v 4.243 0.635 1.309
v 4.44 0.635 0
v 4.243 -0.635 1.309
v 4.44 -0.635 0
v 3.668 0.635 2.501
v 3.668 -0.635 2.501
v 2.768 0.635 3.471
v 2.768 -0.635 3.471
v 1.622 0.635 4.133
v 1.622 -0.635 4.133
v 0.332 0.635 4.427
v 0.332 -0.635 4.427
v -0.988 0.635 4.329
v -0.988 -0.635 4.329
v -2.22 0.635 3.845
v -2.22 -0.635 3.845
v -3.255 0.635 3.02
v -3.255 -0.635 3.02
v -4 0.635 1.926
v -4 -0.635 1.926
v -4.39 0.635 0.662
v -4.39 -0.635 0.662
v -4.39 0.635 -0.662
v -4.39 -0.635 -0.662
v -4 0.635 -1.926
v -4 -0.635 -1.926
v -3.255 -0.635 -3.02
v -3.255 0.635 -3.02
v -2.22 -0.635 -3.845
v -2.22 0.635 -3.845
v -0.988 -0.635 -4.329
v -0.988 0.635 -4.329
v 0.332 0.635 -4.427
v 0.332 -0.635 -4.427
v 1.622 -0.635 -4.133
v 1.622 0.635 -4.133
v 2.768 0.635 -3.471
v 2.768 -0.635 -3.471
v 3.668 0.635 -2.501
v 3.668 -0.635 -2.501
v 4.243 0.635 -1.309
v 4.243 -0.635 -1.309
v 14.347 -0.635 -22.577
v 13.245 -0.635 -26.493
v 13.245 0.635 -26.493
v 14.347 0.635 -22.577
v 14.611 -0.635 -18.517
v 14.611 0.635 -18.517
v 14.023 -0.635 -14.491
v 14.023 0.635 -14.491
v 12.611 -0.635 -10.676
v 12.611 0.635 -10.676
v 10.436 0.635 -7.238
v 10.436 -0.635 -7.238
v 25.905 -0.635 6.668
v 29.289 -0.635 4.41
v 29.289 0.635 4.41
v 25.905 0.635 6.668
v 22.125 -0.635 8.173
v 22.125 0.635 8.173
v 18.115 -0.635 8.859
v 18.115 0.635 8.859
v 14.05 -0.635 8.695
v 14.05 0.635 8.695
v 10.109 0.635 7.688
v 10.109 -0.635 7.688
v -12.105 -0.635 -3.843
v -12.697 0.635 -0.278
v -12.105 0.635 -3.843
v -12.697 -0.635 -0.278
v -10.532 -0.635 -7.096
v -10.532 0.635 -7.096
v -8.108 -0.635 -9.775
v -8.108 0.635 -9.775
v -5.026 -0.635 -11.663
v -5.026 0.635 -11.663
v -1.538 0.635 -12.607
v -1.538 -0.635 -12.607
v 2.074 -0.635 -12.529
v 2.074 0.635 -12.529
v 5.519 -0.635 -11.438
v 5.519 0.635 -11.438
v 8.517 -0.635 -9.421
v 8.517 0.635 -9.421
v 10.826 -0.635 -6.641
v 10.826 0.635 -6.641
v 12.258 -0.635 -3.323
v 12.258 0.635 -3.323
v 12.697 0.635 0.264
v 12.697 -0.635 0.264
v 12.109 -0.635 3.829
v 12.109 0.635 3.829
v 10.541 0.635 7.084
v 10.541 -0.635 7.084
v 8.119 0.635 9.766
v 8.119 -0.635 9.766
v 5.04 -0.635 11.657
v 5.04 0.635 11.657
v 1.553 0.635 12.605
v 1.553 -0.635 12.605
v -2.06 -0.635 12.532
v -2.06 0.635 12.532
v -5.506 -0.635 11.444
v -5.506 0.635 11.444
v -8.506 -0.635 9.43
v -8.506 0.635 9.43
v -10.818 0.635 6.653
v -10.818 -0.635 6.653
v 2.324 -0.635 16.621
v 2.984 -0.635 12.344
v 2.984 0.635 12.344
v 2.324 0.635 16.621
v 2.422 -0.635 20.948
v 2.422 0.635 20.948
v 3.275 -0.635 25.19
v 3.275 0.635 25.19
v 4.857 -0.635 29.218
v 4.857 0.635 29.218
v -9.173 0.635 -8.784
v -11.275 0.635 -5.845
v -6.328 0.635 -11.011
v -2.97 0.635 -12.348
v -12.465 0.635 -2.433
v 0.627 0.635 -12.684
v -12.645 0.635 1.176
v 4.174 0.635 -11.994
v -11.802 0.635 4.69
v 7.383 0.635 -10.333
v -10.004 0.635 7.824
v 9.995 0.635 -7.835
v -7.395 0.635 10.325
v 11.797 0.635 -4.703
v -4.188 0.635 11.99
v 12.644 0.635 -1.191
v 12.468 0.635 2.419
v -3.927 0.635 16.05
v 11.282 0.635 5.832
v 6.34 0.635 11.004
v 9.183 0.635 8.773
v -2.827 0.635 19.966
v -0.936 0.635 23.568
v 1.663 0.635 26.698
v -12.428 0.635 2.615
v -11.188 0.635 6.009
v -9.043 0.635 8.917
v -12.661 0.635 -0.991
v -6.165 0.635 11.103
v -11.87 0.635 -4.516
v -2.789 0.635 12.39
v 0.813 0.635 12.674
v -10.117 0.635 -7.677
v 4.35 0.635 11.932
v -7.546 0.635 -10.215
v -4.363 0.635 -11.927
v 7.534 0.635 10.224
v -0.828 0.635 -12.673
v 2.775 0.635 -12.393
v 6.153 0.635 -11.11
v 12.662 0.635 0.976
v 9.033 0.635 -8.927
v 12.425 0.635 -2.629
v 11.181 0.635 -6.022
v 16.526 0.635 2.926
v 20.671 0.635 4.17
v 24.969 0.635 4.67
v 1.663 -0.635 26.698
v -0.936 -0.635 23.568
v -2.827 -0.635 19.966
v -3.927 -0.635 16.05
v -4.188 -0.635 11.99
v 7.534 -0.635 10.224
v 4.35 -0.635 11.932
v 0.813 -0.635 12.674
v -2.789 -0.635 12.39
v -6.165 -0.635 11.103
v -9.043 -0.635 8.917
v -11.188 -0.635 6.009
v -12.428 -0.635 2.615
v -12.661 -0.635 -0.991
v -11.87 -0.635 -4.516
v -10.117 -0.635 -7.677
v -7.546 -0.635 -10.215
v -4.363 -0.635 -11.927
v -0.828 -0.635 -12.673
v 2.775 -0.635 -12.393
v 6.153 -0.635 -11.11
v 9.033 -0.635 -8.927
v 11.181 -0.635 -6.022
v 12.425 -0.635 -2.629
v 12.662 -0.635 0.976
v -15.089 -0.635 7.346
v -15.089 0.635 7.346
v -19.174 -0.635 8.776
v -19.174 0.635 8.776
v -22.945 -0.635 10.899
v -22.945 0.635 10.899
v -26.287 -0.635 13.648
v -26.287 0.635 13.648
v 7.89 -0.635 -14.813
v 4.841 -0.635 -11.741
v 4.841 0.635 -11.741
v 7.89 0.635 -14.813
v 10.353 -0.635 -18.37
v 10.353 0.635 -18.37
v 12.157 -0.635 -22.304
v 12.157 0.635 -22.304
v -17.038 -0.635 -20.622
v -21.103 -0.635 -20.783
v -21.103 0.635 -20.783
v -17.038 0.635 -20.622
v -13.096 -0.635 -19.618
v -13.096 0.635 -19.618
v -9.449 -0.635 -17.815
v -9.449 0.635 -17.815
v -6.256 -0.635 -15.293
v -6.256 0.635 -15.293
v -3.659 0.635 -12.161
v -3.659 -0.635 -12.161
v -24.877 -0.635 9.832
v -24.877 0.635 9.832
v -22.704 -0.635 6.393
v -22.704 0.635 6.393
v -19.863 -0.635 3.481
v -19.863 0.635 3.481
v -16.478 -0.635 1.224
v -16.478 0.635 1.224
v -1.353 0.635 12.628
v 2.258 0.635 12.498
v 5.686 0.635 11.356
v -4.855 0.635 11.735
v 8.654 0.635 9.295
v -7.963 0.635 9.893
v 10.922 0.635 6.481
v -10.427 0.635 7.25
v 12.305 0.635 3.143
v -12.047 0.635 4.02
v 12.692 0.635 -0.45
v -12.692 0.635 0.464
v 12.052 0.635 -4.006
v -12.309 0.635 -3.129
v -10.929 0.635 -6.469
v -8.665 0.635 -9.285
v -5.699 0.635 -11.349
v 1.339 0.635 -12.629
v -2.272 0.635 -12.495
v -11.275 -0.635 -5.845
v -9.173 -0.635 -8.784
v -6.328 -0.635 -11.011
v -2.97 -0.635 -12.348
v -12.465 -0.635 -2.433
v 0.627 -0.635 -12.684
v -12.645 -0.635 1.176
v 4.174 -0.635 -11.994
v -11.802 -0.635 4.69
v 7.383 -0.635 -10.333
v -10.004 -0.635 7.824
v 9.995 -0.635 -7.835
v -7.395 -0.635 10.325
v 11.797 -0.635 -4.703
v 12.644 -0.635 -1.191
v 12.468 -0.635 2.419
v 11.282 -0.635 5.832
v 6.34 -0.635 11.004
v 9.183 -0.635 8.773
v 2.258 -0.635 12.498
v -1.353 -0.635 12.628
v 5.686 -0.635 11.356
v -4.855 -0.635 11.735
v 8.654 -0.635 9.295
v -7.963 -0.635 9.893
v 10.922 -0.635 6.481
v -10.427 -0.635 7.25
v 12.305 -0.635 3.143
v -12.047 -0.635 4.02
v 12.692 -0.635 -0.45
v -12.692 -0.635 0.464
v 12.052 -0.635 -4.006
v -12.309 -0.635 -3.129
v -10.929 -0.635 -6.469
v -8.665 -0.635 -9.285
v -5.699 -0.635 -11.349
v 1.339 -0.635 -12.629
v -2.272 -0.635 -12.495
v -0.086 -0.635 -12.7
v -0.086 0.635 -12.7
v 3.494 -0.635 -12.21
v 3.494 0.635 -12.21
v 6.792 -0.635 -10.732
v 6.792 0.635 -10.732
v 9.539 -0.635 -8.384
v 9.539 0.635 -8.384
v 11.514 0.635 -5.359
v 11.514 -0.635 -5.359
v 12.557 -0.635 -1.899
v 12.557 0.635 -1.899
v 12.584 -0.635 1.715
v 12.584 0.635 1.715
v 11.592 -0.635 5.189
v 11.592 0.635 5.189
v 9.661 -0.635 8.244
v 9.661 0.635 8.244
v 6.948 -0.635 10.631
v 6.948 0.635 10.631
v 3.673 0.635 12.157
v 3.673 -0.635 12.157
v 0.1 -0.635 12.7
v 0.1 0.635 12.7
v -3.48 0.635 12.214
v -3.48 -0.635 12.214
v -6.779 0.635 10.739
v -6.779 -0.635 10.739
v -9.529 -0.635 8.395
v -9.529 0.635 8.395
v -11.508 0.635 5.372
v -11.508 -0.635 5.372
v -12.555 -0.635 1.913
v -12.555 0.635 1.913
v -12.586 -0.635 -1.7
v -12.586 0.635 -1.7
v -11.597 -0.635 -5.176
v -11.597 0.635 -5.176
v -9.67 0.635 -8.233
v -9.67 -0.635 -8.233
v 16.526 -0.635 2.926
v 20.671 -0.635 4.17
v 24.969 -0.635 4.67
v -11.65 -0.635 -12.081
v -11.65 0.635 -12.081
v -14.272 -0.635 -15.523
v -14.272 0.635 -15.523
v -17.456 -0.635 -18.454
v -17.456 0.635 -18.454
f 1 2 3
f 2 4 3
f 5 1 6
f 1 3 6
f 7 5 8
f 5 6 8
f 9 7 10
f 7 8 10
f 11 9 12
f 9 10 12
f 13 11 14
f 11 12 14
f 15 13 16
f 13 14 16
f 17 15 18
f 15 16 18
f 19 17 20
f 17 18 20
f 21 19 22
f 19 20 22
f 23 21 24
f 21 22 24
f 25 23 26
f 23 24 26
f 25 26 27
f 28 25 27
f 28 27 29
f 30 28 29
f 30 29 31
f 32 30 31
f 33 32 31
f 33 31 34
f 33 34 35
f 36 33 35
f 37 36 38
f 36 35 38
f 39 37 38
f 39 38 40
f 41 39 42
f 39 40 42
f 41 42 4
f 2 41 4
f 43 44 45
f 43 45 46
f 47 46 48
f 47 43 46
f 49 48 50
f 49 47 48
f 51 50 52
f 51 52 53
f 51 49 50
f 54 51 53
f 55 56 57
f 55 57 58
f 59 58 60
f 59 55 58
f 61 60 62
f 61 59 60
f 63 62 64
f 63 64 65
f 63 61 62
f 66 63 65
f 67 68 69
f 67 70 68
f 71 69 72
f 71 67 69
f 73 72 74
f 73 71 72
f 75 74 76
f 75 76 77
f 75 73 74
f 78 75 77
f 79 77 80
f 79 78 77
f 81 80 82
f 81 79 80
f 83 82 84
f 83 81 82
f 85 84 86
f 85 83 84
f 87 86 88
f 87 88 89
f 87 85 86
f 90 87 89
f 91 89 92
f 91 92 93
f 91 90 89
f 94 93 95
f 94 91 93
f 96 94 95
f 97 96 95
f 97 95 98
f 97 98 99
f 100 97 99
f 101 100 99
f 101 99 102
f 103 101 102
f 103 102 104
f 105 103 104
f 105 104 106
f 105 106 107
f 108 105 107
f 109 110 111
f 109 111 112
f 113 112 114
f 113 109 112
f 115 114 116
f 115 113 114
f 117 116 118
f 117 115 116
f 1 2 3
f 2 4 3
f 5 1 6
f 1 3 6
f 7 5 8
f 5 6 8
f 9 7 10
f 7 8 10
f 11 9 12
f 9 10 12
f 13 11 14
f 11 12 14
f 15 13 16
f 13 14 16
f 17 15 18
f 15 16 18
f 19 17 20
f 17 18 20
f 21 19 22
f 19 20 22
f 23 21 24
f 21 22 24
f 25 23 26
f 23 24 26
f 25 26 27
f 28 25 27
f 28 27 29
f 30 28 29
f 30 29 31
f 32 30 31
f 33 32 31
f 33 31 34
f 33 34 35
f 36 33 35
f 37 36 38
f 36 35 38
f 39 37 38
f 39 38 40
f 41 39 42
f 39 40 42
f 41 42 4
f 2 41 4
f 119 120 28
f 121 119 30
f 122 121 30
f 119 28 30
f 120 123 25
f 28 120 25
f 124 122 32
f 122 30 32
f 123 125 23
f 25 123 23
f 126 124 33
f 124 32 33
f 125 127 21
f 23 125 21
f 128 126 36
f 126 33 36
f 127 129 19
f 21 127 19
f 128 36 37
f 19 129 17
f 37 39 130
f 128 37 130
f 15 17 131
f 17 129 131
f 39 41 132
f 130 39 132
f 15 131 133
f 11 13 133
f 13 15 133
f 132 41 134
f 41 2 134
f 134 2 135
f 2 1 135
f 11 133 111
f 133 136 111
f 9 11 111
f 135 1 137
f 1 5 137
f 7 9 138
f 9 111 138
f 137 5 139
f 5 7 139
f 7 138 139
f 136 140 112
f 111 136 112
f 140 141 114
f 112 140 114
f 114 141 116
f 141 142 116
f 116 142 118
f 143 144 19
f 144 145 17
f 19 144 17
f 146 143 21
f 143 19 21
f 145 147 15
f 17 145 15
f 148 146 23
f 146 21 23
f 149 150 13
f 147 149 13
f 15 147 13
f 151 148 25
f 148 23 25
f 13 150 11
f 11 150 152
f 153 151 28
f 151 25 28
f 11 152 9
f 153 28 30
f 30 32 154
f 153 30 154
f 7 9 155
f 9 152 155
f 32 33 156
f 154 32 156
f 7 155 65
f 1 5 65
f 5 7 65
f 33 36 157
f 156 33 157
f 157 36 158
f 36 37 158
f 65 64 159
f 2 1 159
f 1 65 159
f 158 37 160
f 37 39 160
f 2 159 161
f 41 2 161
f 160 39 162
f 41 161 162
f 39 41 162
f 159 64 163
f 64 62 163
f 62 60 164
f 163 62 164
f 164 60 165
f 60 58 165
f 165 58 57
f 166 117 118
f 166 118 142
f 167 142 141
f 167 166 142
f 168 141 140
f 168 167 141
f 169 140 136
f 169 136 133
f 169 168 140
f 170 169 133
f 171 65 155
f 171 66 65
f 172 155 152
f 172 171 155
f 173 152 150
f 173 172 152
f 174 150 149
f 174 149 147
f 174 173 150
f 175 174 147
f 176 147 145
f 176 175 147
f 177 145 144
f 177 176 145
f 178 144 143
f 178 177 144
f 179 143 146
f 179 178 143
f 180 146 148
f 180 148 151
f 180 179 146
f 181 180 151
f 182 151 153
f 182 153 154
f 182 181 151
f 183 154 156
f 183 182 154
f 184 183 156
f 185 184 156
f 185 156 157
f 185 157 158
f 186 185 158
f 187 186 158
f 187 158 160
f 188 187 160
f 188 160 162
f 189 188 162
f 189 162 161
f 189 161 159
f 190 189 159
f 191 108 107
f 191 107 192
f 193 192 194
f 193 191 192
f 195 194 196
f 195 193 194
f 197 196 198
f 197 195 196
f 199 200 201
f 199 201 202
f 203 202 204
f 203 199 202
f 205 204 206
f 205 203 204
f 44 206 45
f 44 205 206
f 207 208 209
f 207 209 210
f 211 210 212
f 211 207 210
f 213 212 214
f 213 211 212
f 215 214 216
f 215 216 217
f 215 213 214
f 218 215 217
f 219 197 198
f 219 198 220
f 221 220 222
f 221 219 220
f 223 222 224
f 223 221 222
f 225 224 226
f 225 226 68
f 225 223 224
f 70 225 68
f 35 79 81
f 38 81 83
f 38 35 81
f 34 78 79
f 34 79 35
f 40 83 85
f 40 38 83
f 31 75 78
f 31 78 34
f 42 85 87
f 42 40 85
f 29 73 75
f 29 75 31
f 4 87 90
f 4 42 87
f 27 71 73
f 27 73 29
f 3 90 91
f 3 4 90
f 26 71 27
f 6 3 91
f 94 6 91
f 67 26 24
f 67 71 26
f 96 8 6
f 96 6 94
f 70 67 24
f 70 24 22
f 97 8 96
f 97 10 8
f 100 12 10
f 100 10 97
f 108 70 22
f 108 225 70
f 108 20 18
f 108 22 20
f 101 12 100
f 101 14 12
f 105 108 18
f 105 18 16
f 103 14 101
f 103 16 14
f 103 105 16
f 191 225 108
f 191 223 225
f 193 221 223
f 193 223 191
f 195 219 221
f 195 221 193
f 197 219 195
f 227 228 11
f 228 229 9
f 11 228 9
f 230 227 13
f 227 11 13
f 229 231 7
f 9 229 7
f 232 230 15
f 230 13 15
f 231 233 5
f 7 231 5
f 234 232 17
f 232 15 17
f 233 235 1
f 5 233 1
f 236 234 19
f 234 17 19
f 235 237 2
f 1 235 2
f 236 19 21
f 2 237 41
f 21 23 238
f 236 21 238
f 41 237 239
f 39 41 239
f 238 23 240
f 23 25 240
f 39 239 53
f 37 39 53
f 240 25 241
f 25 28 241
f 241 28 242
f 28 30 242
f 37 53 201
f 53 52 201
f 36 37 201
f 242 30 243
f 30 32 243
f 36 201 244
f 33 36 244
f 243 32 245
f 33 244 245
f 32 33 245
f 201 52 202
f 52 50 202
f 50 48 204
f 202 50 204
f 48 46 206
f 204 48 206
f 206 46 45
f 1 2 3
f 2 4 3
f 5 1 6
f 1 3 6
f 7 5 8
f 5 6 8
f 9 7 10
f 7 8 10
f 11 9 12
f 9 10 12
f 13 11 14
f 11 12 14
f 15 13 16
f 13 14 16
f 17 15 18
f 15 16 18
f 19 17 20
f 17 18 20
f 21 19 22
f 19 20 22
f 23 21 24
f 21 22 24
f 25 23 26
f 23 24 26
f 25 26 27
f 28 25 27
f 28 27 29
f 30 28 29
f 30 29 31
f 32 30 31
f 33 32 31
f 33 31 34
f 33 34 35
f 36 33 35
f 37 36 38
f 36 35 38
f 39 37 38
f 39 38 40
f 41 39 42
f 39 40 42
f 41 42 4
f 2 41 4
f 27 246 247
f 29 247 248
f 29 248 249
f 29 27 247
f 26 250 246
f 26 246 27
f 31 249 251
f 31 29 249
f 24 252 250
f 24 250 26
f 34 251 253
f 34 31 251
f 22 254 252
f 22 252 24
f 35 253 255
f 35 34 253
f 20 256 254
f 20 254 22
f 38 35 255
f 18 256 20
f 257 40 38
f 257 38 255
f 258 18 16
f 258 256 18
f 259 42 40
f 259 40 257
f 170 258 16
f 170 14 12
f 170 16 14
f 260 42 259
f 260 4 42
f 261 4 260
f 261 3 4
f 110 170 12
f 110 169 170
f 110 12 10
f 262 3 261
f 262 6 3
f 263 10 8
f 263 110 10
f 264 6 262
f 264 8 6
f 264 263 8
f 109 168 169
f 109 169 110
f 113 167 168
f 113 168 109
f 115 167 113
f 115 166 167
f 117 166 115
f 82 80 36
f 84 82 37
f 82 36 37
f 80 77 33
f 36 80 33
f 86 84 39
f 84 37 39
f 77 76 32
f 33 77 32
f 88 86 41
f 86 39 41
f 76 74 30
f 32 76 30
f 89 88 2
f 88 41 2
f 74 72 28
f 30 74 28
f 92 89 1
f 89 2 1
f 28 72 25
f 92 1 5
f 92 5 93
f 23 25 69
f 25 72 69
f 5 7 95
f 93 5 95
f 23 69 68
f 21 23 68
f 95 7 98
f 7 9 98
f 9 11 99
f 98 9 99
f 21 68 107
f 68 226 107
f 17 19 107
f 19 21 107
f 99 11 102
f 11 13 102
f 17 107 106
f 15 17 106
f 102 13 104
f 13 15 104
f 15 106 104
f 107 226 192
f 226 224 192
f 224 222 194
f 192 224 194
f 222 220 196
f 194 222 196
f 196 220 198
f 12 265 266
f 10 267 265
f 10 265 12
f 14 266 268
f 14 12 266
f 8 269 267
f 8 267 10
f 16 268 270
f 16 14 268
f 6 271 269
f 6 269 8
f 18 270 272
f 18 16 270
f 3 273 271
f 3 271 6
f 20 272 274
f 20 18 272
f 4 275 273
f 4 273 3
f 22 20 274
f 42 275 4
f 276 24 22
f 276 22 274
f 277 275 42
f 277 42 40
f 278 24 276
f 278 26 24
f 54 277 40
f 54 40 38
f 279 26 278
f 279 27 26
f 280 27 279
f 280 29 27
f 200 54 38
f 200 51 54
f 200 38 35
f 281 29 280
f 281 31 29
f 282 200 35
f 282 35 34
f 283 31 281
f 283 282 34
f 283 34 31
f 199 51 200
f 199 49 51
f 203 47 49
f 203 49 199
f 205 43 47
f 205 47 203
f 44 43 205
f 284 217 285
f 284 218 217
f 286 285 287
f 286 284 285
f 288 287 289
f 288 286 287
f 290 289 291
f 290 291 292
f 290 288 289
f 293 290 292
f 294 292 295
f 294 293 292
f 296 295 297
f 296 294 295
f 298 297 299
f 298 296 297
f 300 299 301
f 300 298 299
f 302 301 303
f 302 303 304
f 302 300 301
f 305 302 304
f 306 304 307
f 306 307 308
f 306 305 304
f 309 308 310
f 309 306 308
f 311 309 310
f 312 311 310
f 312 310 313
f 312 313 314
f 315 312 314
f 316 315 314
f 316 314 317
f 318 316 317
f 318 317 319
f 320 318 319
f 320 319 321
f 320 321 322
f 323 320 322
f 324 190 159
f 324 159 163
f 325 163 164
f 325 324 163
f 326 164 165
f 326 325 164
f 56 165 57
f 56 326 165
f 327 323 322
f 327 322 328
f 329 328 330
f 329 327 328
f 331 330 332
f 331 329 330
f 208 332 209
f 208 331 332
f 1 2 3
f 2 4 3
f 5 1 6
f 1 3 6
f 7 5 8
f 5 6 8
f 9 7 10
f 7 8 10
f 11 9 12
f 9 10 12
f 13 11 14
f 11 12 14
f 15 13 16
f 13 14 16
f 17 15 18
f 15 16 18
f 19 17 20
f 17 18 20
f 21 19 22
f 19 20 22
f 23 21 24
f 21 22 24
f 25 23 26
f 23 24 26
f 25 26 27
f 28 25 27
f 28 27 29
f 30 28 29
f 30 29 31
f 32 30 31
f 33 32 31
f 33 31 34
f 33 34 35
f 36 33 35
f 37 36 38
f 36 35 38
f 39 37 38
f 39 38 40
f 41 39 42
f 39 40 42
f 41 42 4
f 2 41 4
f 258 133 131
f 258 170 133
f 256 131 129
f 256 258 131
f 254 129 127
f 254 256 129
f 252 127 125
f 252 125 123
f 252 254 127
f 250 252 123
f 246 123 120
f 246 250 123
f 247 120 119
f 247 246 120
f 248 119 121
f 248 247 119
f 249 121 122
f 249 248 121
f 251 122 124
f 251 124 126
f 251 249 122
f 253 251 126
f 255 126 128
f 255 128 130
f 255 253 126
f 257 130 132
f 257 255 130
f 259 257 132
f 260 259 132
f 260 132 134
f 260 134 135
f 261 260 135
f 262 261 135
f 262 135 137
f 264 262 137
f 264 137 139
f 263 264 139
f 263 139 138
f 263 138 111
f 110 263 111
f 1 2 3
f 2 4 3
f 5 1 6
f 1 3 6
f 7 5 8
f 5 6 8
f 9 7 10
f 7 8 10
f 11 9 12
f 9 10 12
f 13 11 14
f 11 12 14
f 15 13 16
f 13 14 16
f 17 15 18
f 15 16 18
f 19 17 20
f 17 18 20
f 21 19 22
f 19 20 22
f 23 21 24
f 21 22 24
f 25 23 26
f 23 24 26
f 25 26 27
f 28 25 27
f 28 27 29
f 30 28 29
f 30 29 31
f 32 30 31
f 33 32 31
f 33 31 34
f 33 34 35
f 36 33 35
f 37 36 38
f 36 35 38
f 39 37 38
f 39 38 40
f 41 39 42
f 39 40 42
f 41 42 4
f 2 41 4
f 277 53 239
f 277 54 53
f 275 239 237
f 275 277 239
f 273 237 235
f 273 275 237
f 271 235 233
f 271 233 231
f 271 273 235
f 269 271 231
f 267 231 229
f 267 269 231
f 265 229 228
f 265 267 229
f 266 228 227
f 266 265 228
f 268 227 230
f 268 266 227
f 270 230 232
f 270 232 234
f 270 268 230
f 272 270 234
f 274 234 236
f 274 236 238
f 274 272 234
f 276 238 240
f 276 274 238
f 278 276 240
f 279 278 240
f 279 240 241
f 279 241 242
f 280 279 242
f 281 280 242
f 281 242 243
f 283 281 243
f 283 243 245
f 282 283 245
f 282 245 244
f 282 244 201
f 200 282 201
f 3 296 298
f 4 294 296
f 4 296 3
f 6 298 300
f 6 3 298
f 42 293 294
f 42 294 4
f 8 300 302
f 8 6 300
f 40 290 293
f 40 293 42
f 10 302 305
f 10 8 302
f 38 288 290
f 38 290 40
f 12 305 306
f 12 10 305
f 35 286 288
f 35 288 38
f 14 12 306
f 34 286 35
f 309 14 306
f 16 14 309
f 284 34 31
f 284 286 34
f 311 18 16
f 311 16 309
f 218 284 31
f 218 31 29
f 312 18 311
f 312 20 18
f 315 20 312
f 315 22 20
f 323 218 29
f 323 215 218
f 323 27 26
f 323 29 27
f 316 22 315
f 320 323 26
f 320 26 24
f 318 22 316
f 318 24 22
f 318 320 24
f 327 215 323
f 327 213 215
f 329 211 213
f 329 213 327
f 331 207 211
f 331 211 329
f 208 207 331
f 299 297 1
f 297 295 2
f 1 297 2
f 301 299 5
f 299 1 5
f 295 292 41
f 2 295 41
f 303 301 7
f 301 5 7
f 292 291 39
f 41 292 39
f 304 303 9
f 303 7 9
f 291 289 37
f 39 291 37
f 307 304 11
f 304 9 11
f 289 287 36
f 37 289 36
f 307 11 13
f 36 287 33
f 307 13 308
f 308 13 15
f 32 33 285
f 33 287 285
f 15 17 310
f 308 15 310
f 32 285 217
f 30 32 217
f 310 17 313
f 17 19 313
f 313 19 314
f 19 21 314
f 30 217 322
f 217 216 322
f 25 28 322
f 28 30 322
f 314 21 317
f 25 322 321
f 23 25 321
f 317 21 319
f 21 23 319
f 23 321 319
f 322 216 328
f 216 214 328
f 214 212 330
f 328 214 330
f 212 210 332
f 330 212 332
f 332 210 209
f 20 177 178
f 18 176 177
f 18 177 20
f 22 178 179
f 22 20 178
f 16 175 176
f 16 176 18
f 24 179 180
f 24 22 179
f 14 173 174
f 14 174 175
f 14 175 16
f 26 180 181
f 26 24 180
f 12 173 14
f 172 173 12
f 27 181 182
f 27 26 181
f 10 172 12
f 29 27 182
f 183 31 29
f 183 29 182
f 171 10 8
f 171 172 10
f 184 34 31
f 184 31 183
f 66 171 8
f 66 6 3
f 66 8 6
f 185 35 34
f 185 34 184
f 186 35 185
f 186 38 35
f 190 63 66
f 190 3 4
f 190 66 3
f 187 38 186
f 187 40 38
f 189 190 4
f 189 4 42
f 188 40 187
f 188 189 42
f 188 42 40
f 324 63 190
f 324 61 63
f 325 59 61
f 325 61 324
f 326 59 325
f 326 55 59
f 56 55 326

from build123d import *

# Parameters (mm, degrees)
F0_R     = 12.7
F1_DEPTH = 0.635
F3_DEPTH = 0.635
F4_COUNT = 5
F5_R     = 4.439905
F6_DEPTH = 0.635


with BuildPart() as f1:
    # F0 (on Front) → F1 (new body, symmetric)
    with BuildSketch(Plane.XZ):
        Circle(F0_R)
    extrude(amount=F1_DEPTH, both=True)

    # F2 (on Front) → F3 (join, symmetric)
    with BuildSketch(Plane.XZ):
        with BuildLine():
            Line((-3.907746, 9.398649), (3.907746, 9.398649))
            ThreePointArc((3.907746, 9.398649), (2.29972, 19.408061), (4.856857, 29.218012))
            ThreePointArc((4.856857, 29.218012), (-2.543282, 20.642892), (-3.907746, 9.398649))
        make_face()
    extrude(amount=F3_DEPTH, both=True)


with BuildPart() as f4_1:
    # F4: instance of F1
    add(f1.part.rotate(Axis((0, -0.635, 0), (0, 1, 0)), 1 * 360 / F4_COUNT))


with BuildPart() as f4_2:
    # F4: instance of F1
    add(f1.part.rotate(Axis((0, -0.635, 0), (0, 1, 0)), 2 * 360 / F4_COUNT))


with BuildPart() as f4_3:
    # F4: instance of F1
    add(f1.part.rotate(Axis((0, -0.635, 0), (0, 1, 0)), 3 * 360 / F4_COUNT))


with BuildPart() as f4_4:
    # F4: instance of F1
    add(f1.part.rotate(Axis((0, -0.635, 0), (0, 1, 0)), 4 * 360 / F4_COUNT))


with BuildPart() as f6_tool:
    # F5 (on Front) → F6 (new body, symmetric)
    with BuildSketch(Plane.XZ):
        Circle(F5_R)
    extrude(amount=F6_DEPTH, both=True)


with BuildPart() as f1_1:
    add(f1.part)

    # F6: cut by f6_tool
    add(f6_tool.part, mode=Mode.SUBTRACT)


with BuildPart() as f4_1_1:
    add(f4_1.part)

    # F6: cut by f6_tool
    add(f6_tool.part, mode=Mode.SUBTRACT)


with BuildPart() as f4_2_1:
    add(f4_2.part)

    # F6: cut by f6_tool
    add(f6_tool.part, mode=Mode.SUBTRACT)


with BuildPart() as f4_3_1:
    add(f4_3.part)

    # F6: cut by f6_tool
    add(f6_tool.part, mode=Mode.SUBTRACT)


with BuildPart() as f4_4_1:
    add(f4_4.part)

    # F6: cut by f6_tool
    add(f6_tool.part, mode=Mode.SUBTRACT)


solid = Compound([f1_1.part, f4_1_1.part, f4_2_1.part, f4_3_1.part, f4_4_1.part])
